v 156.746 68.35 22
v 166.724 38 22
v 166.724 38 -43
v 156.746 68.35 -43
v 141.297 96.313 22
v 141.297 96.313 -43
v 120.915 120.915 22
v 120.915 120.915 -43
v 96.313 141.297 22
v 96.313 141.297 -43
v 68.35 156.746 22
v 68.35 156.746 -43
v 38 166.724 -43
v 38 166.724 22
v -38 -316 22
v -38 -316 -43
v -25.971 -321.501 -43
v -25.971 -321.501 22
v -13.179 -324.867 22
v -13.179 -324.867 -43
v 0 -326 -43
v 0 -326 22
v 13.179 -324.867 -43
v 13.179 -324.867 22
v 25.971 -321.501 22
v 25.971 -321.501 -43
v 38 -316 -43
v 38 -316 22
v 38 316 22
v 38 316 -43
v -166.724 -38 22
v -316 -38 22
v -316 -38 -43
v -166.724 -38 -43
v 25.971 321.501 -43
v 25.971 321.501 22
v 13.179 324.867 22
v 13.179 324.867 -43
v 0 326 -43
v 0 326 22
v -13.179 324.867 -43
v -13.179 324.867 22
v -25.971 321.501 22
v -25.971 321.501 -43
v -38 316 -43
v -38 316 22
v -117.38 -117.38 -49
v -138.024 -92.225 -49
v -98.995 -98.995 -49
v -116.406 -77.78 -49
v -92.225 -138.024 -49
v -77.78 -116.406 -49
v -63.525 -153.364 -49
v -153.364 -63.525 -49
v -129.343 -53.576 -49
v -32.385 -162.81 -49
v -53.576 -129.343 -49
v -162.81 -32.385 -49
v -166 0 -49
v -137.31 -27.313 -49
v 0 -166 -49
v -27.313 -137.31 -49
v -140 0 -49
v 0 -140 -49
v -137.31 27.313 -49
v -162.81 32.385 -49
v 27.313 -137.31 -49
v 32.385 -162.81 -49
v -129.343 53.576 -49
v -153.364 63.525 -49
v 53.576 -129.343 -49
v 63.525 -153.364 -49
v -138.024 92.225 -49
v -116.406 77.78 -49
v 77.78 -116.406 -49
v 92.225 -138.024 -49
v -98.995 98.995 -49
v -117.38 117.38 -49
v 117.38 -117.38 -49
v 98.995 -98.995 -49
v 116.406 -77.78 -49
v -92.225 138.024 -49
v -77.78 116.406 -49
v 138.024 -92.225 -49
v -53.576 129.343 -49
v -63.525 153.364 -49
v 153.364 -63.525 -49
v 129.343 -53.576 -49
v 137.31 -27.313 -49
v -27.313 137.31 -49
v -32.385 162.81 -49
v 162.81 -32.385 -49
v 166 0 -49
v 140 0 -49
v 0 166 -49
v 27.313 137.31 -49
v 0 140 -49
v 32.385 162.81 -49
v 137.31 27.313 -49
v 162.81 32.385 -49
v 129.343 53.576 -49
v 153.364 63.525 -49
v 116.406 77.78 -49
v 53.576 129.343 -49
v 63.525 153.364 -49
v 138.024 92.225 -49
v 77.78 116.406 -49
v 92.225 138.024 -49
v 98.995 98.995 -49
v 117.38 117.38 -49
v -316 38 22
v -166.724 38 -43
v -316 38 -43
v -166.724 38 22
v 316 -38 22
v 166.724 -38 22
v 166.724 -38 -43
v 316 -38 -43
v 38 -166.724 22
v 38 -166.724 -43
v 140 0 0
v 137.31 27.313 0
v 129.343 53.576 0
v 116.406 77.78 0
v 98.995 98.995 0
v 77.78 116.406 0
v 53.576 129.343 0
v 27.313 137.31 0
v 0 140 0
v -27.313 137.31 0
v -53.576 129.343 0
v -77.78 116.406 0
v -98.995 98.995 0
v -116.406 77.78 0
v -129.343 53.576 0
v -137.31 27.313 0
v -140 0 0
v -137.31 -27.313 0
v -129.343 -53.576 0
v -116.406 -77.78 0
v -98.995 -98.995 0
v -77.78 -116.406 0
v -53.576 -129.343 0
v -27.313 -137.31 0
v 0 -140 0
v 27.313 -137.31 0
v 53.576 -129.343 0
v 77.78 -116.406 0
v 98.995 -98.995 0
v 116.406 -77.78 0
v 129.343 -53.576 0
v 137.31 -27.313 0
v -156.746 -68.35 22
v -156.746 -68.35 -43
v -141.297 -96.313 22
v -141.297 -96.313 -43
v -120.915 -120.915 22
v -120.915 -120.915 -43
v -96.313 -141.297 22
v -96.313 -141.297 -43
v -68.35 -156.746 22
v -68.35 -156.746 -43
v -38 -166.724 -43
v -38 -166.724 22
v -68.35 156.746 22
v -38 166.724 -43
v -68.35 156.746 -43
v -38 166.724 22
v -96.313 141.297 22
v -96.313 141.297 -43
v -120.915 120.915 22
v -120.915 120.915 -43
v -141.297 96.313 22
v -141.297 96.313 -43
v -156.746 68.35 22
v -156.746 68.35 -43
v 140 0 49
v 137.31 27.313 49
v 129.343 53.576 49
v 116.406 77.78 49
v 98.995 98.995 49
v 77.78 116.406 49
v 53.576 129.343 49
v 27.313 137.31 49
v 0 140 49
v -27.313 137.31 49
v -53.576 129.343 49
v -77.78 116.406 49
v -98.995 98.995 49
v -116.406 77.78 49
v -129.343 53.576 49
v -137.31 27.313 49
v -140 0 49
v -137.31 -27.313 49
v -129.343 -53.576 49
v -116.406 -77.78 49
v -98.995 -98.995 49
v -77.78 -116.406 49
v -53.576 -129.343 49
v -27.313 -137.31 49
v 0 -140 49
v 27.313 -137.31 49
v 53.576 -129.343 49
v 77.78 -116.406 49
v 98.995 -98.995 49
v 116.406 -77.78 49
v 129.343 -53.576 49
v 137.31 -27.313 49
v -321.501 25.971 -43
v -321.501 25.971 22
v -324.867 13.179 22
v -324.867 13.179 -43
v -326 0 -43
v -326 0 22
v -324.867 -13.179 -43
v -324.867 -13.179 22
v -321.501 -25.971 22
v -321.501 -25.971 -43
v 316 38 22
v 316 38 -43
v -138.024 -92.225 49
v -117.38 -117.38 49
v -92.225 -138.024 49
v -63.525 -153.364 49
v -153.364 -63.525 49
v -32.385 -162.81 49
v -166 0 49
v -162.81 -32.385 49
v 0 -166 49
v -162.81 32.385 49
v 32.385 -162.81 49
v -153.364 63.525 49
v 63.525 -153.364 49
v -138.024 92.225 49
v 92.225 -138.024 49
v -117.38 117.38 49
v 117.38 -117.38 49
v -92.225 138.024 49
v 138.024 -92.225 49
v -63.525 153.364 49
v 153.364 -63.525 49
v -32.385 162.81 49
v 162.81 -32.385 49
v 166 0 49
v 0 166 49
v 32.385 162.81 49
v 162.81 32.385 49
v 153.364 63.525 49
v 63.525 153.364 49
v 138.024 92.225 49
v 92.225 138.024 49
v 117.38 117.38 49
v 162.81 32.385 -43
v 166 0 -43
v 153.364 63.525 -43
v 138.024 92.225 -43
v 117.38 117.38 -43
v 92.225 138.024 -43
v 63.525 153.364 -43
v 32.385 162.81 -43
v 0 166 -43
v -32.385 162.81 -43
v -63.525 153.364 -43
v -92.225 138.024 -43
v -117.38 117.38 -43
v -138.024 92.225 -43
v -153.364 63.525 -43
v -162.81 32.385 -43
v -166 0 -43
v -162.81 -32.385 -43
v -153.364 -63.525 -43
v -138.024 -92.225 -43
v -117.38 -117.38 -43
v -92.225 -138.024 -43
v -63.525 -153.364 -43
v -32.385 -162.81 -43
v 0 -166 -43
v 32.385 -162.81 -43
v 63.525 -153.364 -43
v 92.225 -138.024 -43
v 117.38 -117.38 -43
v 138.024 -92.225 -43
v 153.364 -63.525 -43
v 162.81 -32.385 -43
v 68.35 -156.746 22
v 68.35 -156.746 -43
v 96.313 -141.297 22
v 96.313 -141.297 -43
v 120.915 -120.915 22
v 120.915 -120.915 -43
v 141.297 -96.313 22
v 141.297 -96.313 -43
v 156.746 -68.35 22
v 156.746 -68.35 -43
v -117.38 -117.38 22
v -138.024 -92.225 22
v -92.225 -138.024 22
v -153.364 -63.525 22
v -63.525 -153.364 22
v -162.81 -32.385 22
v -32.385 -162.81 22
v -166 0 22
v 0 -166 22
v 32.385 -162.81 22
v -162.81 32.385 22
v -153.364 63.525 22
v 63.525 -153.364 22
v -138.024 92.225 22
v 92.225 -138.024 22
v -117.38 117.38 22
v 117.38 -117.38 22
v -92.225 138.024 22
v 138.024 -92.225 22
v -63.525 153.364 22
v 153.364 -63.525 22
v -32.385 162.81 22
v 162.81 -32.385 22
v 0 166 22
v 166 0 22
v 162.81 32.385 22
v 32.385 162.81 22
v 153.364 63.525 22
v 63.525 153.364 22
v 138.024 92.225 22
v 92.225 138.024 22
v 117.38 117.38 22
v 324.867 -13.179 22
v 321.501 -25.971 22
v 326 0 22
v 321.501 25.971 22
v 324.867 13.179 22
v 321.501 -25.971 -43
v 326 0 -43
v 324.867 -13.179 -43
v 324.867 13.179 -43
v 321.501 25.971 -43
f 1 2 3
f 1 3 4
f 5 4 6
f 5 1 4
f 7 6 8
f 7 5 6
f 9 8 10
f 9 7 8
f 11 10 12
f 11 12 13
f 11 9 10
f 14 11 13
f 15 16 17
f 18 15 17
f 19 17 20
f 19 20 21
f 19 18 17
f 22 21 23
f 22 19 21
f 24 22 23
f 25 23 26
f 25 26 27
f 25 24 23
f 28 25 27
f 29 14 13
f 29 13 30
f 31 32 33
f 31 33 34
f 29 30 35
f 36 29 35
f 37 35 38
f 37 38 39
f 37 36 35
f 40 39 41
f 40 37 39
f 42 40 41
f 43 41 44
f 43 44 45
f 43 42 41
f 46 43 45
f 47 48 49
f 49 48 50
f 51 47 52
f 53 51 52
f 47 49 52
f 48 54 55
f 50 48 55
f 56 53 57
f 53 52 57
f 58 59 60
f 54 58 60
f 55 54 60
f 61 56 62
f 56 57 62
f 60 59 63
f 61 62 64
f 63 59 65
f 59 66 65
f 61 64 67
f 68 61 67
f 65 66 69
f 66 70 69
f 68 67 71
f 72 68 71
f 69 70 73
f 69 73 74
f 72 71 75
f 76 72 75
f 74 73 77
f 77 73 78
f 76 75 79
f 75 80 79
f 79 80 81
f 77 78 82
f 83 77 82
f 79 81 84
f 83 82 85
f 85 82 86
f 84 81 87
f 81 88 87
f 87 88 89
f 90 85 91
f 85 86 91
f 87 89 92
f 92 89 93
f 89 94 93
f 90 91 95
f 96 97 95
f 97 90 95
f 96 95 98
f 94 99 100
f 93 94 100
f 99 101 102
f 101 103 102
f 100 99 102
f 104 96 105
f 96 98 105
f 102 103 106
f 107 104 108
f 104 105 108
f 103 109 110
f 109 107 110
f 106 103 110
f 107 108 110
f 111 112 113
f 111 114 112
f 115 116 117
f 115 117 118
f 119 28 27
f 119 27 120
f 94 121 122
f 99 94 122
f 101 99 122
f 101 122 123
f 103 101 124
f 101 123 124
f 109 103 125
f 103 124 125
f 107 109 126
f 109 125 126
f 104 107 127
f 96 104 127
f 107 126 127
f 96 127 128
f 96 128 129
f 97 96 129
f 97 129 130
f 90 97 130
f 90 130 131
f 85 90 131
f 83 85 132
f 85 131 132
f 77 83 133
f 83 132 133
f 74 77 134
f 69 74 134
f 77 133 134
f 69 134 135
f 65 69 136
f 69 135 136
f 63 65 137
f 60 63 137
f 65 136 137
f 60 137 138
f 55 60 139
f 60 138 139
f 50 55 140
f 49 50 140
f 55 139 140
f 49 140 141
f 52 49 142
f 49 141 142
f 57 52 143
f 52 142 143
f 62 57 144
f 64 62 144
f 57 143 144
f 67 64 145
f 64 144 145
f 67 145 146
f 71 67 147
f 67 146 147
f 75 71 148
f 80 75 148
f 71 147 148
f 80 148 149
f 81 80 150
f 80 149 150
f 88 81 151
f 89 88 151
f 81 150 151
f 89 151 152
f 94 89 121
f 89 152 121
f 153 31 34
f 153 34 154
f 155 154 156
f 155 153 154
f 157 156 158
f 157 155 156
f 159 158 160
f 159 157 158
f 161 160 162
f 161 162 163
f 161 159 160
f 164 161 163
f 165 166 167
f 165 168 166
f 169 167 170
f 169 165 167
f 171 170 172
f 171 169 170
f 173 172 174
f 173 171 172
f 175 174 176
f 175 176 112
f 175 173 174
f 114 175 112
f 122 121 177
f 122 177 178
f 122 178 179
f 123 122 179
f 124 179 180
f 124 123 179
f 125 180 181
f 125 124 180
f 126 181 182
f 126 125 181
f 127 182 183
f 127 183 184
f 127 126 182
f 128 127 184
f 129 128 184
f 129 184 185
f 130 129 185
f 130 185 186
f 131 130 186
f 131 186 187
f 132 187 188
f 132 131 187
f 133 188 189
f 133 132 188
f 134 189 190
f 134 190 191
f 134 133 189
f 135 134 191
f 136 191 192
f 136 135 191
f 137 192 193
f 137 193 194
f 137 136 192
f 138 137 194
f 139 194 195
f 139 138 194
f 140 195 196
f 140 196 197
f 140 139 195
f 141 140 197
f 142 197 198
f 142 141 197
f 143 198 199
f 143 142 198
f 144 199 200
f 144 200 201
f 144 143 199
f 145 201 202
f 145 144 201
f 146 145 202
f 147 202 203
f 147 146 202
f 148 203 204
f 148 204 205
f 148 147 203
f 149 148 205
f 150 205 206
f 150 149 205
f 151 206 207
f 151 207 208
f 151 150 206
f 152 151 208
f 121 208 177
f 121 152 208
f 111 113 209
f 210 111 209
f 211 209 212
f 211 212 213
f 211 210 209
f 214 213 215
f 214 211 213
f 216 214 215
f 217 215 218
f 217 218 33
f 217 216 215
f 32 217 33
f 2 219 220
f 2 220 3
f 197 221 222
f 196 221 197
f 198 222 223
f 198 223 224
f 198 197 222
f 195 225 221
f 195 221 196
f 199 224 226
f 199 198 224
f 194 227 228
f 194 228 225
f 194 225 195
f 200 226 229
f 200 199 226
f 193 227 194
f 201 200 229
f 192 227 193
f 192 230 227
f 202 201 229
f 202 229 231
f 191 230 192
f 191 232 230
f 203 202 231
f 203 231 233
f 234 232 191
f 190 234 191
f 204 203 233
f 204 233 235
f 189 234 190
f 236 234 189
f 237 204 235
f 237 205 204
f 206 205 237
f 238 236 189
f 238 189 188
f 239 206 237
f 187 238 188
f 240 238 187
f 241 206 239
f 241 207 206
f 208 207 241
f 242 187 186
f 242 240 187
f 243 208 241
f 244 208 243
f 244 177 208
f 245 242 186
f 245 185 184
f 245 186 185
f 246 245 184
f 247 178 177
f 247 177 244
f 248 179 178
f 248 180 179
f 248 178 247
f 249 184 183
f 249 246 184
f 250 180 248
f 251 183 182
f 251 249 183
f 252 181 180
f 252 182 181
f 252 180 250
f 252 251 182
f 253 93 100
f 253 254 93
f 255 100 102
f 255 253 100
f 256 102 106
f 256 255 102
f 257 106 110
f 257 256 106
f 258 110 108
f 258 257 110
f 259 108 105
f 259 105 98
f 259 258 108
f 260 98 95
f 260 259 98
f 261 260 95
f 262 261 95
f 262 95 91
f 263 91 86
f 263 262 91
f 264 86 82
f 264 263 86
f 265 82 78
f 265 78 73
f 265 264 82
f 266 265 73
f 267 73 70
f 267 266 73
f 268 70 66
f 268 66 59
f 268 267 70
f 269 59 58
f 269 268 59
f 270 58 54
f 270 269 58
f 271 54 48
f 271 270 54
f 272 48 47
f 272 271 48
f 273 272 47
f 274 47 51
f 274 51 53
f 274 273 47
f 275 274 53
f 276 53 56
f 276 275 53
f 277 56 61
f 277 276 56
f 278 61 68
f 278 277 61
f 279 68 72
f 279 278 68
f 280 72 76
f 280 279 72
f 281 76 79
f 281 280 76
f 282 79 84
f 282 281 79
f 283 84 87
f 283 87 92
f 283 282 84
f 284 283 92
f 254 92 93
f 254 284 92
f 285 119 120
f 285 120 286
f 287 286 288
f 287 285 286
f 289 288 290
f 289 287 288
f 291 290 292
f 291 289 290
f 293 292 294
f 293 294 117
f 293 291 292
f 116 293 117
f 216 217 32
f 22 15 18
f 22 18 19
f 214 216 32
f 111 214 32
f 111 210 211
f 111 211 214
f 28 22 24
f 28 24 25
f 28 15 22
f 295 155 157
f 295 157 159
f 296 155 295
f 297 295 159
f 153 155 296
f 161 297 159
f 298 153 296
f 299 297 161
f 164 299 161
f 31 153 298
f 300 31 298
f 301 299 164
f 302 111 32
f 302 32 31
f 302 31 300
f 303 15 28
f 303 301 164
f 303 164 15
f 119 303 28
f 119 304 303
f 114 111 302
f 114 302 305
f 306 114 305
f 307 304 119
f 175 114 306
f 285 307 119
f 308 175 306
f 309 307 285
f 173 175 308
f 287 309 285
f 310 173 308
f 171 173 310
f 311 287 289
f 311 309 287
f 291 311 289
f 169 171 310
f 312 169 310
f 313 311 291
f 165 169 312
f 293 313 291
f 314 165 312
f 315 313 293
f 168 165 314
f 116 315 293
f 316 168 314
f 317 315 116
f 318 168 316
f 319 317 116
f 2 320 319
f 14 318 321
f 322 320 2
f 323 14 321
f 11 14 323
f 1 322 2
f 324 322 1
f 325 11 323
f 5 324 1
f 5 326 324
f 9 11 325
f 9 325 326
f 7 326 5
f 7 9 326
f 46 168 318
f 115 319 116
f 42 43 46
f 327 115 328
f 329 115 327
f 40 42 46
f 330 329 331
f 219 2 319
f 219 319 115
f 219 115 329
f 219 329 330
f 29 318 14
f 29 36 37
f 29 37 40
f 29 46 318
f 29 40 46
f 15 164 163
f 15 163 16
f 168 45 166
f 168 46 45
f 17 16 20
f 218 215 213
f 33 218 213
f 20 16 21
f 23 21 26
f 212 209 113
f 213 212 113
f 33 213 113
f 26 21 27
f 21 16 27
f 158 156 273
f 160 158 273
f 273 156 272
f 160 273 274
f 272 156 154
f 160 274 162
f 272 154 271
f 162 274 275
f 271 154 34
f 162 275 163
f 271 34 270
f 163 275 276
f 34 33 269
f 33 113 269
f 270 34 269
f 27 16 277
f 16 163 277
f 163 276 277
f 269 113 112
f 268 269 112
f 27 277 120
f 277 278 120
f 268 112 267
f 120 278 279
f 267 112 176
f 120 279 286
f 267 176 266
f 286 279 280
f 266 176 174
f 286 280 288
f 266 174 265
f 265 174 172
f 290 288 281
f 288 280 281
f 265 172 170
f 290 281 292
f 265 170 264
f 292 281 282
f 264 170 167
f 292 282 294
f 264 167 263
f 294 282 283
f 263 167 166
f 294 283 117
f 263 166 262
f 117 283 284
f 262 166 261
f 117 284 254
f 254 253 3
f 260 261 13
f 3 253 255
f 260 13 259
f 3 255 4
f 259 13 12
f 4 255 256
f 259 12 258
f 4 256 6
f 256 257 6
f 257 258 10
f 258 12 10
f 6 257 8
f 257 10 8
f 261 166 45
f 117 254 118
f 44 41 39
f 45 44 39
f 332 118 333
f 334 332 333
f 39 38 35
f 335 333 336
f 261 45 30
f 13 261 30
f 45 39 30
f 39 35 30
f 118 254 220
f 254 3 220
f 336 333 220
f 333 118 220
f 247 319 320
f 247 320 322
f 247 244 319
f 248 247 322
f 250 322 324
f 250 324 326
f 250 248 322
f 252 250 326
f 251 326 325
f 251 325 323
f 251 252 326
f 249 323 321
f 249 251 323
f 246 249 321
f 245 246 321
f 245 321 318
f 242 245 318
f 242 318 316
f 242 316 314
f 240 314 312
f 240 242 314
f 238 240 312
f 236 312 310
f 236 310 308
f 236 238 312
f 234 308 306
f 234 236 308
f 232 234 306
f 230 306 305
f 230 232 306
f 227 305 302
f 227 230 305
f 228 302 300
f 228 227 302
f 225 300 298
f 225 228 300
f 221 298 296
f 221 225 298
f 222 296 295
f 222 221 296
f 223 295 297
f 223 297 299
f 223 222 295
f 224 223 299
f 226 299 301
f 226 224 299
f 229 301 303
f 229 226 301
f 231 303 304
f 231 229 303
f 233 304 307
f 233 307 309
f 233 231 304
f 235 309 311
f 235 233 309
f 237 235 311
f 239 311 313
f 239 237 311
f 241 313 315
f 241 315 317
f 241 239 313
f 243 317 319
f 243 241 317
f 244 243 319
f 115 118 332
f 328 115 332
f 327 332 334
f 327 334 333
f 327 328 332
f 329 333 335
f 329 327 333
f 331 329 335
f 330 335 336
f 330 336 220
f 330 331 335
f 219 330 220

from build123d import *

# Parameters (mm, degrees)
F0_R     = 166
F0_R_2   = 140
F1_DEPTH = 49
F2_DEPTH = 49
F3_DEPTH = 22
F4_DEPTH = 43


with BuildPart() as f1:
    # F0 (on Top) → F1 (new body)
    with BuildSketch(Plane.XY):
        Circle(F0_R)
        Circle(F0_R_2, mode=Mode.SUBTRACT)
    extrude(amount=F1_DEPTH)

    # F0 (on Top) → F2 (join)
    with BuildSketch(Plane.XY):
        Circle(F0_R)
        Circle(F0_R_2, mode=Mode.SUBTRACT)
    extrude(amount=-F2_DEPTH)

    # F0 (on Top) → F3 (join)
    with BuildSketch(Plane.XY):
        with BuildLine():
            ThreePointArc((166.7243233605, -38), (169.9277188905, -19.1198941598), (171, 0))
            ThreePointArc((171, 0), (169.9277188905, 19.1198941598), (166.7243233605, 38))
            ThreePointArc((166.7243233605, 38), (120.9152595829, 120.9152595829), (38, 166.7243233605))
            ThreePointArc((38, 166.7243233605), (19.1198941598, 169.9277188905), (0, 171))
            ThreePointArc((0, 171), (-19.1198941598, 169.9277188905), (-38, 166.7243233605))
            ThreePointArc((-38, 166.7243233605), (-120.9152595829, 120.9152595829), (-166.7243233605, 38))
            ThreePointArc((-166.7243233605, 38), (-169.9277188905, 19.1198941598), (-171, 0))
            ThreePointArc((-171, 0), (-169.9277188905, -19.1198941598), (-166.7243233605, -38))
            ThreePointArc((-166.7243233605, -38), (-120.9152595829, -120.9152595829), (-38, -166.7243233605))
            ThreePointArc((-38, -166.7243233605), (-19.1198941598, -169.9277188905), (0, -171))
            ThreePointArc((0, -171), (19.1198941598, -169.9277188905), (38, -166.7243233605))
            ThreePointArc((38, -166.7243233605), (120.9152595829, -120.9152595829), (166.7243233605, -38))
        make_face()
        Circle(F0_R, mode=Mode.SUBTRACT)
        with BuildLine():
            Line((-316, -38), (-166.7243233605, -38))
            ThreePointArc((-166.7243233605, -38), (-169.9277188905, -19.1198941598), (-171, 0))
            Line((-171, 0), (-326, 0))
            ThreePointArc((-326, 0), (-323.4581542767, -19.6468827044), (-316, -38))
        make_face()
        with BuildLine():
            ThreePointArc((-171, 0), (-169.9277188905, 19.1198941598), (-166.7243233605, 38))
            Line((-166.7243233605, 38), (-316, 38))
            ThreePointArc((-316, 38), (-323.4581542767, 19.6468827044), (-326, 0))
            Line((-326, 0), (-171, 0))
        make_face()
        with BuildLine():
            ThreePointArc((-38, 166.7243233605), (-19.1198941598, 169.9277188905), (0, 171))
            Line((0, 171), (0, 326))
            ThreePointArc((0, 326), (-19.6468827044, 323.4581542767), (-38, 316))
            Line((-38, 316), (-38, 166.7243233605))
        make_face()
        with BuildLine():
            ThreePointArc((0, 171), (19.1198941598, 169.9277188905), (38, 166.7243233605))
            Line((38, 166.7243233605), (38, 316))
            ThreePointArc((38, 316), (19.6468827044, 323.4581542767), (0, 326))
            Line((0, 326), (0, 171))
        make_face()
        with BuildLine():
            ThreePointArc((166.7243233605, 38), (169.9277188905, 19.1198941598), (171, 0))
            Line((171, 0), (326, 0))
            ThreePointArc((326, 0), (323.4581542767, 19.6468827044), (316, 38))
            Line((316, 38), (166.7243233605, 38))
        make_face()
        with BuildLine():
            Line((326, 0), (171, 0))
            ThreePointArc((171, 0), (169.9277188905, -19.1198941598), (166.7243233605, -38))
            Line((166.7243233605, -38), (316, -38))
            ThreePointArc((316, -38), (323.4581542767, -19.6468827044), (326, 0))
        make_face()
        with BuildLine():
            Line((38, -316), (38, -166.7243233605))
            ThreePointArc((38, -166.7243233605), (19.1198941598, -169.9277188905), (0, -171))
            Line((0, -171), (0, -326))
            ThreePointArc((0, -326), (19.6468827044, -323.4581542767), (38, -316))
        make_face()
        with BuildLine():
            Line((0, -326), (0, -171))
            ThreePointArc((0, -171), (-19.1198941598, -169.9277188905), (-38, -166.7243233605))
            Line((-38, -166.7243233605), (-38, -316))
            ThreePointArc((-38, -316), (-19.6468827044, -323.4581542767), (0, -326))
        make_face()
    extrude(amount=F3_DEPTH)

    # F0 (on Top) → F4 (join)
    with BuildSketch(Plane.XY):
        with BuildLine():
            ThreePointArc((-171, 0), (-169.9277188905, 19.1198941598), (-166.7243233605, 38))
            Line((-166.7243233605, 38), (-316, 38))
            ThreePointArc((-316, 38), (-323.4581542767, 19.6468827044), (-326, 0))
            Line((-326, 0), (-171, 0))
        make_face()
        with BuildLine():
            Line((-316, -38), (-166.7243233605, -38))
            ThreePointArc((-166.7243233605, -38), (-169.9277188905, -19.1198941598), (-171, 0))
            Line((-171, 0), (-326, 0))
            ThreePointArc((-326, 0), (-323.4581542767, -19.6468827044), (-316, -38))
        make_face()
        with BuildLine():
            ThreePointArc((166.7243233605, -38), (169.9277188905, -19.1198941598), (171, 0))
            ThreePointArc((171, 0), (169.9277188905, 19.1198941598), (166.7243233605, 38))
            ThreePointArc((166.7243233605, 38), (120.9152595829, 120.9152595829), (38, 166.7243233605))
            ThreePointArc((38, 166.7243233605), (19.1198941598, 169.9277188905), (0, 171))
            ThreePointArc((0, 171), (-19.1198941598, 169.9277188905), (-38, 166.7243233605))
            ThreePointArc((-38, 166.7243233605), (-120.9152595829, 120.9152595829), (-166.7243233605, 38))
            ThreePointArc((-166.7243233605, 38), (-169.9277188905, 19.1198941598), (-171, 0))
            ThreePointArc((-171, 0), (-169.9277188905, -19.1198941598), (-166.7243233605, -38))
            ThreePointArc((-166.7243233605, -38), (-120.9152595829, -120.9152595829), (-38, -166.7243233605))
            ThreePointArc((-38, -166.7243233605), (-19.1198941598, -169.9277188905), (0, -171))
            ThreePointArc((0, -171), (19.1198941598, -169.9277188905), (38, -166.7243233605))
            ThreePointArc((38, -166.7243233605), (120.9152595829, -120.9152595829), (166.7243233605, -38))
        make_face()
        Circle(F0_R, mode=Mode.SUBTRACT)
        with BuildLine():
            Line((0, -326), (0, -171))
            ThreePointArc((0, -171), (-19.1198941598, -169.9277188905), (-38, -166.7243233605))
            Line((-38, -166.7243233605), (-38, -316))
            ThreePointArc((-38, -316), (-19.6468827044, -323.4581542767), (0, -326))
        make_face()
        with BuildLine():
            Line((38, -316), (38, -166.7243233605))
            ThreePointArc((38, -166.7243233605), (19.1198941598, -169.9277188905), (0, -171))
            Line((0, -171), (0, -326))
            ThreePointArc((0, -326), (19.6468827044, -323.4581542767), (38, -316))
        make_face()
        with BuildLine():
            Line((326, 0), (171, 0))
            ThreePointArc((171, 0), (169.9277188905, -19.1198941598), (166.7243233605, -38))
            Line((166.7243233605, -38), (316, -38))
            ThreePointArc((316, -38), (323.4581542767, -19.6468827044), (326, 0))
        make_face()
        with BuildLine():
            ThreePointArc((166.7243233605, 38), (169.9277188905, 19.1198941598), (171, 0))
            Line((171, 0), (326, 0))
            ThreePointArc((326, 0), (323.4581542767, 19.6468827044), (316, 38))
            Line((316, 38), (166.7243233605, 38))
        make_face()
        with BuildLine():
            ThreePointArc((0, 171), (19.1198941598, 169.9277188905), (38, 166.7243233605))
            Line((38, 166.7243233605), (38, 316))
            ThreePointArc((38, 316), (19.6468827044, 323.4581542767), (0, 326))
            Line((0, 326), (0, 171))
        make_face()
        with BuildLine():
            ThreePointArc((-38, 166.7243233605), (-19.1198941598, 169.9277188905), (0, 171))
            Line((0, 171), (0, 326))
            ThreePointArc((0, 326), (-19.6468827044, 323.4581542767), (-38, 316))
            Line((-38, 316), (-38, 166.7243233605))
        make_face()
    extrude(amount=-F4_DEPTH)


solid = f1.part
